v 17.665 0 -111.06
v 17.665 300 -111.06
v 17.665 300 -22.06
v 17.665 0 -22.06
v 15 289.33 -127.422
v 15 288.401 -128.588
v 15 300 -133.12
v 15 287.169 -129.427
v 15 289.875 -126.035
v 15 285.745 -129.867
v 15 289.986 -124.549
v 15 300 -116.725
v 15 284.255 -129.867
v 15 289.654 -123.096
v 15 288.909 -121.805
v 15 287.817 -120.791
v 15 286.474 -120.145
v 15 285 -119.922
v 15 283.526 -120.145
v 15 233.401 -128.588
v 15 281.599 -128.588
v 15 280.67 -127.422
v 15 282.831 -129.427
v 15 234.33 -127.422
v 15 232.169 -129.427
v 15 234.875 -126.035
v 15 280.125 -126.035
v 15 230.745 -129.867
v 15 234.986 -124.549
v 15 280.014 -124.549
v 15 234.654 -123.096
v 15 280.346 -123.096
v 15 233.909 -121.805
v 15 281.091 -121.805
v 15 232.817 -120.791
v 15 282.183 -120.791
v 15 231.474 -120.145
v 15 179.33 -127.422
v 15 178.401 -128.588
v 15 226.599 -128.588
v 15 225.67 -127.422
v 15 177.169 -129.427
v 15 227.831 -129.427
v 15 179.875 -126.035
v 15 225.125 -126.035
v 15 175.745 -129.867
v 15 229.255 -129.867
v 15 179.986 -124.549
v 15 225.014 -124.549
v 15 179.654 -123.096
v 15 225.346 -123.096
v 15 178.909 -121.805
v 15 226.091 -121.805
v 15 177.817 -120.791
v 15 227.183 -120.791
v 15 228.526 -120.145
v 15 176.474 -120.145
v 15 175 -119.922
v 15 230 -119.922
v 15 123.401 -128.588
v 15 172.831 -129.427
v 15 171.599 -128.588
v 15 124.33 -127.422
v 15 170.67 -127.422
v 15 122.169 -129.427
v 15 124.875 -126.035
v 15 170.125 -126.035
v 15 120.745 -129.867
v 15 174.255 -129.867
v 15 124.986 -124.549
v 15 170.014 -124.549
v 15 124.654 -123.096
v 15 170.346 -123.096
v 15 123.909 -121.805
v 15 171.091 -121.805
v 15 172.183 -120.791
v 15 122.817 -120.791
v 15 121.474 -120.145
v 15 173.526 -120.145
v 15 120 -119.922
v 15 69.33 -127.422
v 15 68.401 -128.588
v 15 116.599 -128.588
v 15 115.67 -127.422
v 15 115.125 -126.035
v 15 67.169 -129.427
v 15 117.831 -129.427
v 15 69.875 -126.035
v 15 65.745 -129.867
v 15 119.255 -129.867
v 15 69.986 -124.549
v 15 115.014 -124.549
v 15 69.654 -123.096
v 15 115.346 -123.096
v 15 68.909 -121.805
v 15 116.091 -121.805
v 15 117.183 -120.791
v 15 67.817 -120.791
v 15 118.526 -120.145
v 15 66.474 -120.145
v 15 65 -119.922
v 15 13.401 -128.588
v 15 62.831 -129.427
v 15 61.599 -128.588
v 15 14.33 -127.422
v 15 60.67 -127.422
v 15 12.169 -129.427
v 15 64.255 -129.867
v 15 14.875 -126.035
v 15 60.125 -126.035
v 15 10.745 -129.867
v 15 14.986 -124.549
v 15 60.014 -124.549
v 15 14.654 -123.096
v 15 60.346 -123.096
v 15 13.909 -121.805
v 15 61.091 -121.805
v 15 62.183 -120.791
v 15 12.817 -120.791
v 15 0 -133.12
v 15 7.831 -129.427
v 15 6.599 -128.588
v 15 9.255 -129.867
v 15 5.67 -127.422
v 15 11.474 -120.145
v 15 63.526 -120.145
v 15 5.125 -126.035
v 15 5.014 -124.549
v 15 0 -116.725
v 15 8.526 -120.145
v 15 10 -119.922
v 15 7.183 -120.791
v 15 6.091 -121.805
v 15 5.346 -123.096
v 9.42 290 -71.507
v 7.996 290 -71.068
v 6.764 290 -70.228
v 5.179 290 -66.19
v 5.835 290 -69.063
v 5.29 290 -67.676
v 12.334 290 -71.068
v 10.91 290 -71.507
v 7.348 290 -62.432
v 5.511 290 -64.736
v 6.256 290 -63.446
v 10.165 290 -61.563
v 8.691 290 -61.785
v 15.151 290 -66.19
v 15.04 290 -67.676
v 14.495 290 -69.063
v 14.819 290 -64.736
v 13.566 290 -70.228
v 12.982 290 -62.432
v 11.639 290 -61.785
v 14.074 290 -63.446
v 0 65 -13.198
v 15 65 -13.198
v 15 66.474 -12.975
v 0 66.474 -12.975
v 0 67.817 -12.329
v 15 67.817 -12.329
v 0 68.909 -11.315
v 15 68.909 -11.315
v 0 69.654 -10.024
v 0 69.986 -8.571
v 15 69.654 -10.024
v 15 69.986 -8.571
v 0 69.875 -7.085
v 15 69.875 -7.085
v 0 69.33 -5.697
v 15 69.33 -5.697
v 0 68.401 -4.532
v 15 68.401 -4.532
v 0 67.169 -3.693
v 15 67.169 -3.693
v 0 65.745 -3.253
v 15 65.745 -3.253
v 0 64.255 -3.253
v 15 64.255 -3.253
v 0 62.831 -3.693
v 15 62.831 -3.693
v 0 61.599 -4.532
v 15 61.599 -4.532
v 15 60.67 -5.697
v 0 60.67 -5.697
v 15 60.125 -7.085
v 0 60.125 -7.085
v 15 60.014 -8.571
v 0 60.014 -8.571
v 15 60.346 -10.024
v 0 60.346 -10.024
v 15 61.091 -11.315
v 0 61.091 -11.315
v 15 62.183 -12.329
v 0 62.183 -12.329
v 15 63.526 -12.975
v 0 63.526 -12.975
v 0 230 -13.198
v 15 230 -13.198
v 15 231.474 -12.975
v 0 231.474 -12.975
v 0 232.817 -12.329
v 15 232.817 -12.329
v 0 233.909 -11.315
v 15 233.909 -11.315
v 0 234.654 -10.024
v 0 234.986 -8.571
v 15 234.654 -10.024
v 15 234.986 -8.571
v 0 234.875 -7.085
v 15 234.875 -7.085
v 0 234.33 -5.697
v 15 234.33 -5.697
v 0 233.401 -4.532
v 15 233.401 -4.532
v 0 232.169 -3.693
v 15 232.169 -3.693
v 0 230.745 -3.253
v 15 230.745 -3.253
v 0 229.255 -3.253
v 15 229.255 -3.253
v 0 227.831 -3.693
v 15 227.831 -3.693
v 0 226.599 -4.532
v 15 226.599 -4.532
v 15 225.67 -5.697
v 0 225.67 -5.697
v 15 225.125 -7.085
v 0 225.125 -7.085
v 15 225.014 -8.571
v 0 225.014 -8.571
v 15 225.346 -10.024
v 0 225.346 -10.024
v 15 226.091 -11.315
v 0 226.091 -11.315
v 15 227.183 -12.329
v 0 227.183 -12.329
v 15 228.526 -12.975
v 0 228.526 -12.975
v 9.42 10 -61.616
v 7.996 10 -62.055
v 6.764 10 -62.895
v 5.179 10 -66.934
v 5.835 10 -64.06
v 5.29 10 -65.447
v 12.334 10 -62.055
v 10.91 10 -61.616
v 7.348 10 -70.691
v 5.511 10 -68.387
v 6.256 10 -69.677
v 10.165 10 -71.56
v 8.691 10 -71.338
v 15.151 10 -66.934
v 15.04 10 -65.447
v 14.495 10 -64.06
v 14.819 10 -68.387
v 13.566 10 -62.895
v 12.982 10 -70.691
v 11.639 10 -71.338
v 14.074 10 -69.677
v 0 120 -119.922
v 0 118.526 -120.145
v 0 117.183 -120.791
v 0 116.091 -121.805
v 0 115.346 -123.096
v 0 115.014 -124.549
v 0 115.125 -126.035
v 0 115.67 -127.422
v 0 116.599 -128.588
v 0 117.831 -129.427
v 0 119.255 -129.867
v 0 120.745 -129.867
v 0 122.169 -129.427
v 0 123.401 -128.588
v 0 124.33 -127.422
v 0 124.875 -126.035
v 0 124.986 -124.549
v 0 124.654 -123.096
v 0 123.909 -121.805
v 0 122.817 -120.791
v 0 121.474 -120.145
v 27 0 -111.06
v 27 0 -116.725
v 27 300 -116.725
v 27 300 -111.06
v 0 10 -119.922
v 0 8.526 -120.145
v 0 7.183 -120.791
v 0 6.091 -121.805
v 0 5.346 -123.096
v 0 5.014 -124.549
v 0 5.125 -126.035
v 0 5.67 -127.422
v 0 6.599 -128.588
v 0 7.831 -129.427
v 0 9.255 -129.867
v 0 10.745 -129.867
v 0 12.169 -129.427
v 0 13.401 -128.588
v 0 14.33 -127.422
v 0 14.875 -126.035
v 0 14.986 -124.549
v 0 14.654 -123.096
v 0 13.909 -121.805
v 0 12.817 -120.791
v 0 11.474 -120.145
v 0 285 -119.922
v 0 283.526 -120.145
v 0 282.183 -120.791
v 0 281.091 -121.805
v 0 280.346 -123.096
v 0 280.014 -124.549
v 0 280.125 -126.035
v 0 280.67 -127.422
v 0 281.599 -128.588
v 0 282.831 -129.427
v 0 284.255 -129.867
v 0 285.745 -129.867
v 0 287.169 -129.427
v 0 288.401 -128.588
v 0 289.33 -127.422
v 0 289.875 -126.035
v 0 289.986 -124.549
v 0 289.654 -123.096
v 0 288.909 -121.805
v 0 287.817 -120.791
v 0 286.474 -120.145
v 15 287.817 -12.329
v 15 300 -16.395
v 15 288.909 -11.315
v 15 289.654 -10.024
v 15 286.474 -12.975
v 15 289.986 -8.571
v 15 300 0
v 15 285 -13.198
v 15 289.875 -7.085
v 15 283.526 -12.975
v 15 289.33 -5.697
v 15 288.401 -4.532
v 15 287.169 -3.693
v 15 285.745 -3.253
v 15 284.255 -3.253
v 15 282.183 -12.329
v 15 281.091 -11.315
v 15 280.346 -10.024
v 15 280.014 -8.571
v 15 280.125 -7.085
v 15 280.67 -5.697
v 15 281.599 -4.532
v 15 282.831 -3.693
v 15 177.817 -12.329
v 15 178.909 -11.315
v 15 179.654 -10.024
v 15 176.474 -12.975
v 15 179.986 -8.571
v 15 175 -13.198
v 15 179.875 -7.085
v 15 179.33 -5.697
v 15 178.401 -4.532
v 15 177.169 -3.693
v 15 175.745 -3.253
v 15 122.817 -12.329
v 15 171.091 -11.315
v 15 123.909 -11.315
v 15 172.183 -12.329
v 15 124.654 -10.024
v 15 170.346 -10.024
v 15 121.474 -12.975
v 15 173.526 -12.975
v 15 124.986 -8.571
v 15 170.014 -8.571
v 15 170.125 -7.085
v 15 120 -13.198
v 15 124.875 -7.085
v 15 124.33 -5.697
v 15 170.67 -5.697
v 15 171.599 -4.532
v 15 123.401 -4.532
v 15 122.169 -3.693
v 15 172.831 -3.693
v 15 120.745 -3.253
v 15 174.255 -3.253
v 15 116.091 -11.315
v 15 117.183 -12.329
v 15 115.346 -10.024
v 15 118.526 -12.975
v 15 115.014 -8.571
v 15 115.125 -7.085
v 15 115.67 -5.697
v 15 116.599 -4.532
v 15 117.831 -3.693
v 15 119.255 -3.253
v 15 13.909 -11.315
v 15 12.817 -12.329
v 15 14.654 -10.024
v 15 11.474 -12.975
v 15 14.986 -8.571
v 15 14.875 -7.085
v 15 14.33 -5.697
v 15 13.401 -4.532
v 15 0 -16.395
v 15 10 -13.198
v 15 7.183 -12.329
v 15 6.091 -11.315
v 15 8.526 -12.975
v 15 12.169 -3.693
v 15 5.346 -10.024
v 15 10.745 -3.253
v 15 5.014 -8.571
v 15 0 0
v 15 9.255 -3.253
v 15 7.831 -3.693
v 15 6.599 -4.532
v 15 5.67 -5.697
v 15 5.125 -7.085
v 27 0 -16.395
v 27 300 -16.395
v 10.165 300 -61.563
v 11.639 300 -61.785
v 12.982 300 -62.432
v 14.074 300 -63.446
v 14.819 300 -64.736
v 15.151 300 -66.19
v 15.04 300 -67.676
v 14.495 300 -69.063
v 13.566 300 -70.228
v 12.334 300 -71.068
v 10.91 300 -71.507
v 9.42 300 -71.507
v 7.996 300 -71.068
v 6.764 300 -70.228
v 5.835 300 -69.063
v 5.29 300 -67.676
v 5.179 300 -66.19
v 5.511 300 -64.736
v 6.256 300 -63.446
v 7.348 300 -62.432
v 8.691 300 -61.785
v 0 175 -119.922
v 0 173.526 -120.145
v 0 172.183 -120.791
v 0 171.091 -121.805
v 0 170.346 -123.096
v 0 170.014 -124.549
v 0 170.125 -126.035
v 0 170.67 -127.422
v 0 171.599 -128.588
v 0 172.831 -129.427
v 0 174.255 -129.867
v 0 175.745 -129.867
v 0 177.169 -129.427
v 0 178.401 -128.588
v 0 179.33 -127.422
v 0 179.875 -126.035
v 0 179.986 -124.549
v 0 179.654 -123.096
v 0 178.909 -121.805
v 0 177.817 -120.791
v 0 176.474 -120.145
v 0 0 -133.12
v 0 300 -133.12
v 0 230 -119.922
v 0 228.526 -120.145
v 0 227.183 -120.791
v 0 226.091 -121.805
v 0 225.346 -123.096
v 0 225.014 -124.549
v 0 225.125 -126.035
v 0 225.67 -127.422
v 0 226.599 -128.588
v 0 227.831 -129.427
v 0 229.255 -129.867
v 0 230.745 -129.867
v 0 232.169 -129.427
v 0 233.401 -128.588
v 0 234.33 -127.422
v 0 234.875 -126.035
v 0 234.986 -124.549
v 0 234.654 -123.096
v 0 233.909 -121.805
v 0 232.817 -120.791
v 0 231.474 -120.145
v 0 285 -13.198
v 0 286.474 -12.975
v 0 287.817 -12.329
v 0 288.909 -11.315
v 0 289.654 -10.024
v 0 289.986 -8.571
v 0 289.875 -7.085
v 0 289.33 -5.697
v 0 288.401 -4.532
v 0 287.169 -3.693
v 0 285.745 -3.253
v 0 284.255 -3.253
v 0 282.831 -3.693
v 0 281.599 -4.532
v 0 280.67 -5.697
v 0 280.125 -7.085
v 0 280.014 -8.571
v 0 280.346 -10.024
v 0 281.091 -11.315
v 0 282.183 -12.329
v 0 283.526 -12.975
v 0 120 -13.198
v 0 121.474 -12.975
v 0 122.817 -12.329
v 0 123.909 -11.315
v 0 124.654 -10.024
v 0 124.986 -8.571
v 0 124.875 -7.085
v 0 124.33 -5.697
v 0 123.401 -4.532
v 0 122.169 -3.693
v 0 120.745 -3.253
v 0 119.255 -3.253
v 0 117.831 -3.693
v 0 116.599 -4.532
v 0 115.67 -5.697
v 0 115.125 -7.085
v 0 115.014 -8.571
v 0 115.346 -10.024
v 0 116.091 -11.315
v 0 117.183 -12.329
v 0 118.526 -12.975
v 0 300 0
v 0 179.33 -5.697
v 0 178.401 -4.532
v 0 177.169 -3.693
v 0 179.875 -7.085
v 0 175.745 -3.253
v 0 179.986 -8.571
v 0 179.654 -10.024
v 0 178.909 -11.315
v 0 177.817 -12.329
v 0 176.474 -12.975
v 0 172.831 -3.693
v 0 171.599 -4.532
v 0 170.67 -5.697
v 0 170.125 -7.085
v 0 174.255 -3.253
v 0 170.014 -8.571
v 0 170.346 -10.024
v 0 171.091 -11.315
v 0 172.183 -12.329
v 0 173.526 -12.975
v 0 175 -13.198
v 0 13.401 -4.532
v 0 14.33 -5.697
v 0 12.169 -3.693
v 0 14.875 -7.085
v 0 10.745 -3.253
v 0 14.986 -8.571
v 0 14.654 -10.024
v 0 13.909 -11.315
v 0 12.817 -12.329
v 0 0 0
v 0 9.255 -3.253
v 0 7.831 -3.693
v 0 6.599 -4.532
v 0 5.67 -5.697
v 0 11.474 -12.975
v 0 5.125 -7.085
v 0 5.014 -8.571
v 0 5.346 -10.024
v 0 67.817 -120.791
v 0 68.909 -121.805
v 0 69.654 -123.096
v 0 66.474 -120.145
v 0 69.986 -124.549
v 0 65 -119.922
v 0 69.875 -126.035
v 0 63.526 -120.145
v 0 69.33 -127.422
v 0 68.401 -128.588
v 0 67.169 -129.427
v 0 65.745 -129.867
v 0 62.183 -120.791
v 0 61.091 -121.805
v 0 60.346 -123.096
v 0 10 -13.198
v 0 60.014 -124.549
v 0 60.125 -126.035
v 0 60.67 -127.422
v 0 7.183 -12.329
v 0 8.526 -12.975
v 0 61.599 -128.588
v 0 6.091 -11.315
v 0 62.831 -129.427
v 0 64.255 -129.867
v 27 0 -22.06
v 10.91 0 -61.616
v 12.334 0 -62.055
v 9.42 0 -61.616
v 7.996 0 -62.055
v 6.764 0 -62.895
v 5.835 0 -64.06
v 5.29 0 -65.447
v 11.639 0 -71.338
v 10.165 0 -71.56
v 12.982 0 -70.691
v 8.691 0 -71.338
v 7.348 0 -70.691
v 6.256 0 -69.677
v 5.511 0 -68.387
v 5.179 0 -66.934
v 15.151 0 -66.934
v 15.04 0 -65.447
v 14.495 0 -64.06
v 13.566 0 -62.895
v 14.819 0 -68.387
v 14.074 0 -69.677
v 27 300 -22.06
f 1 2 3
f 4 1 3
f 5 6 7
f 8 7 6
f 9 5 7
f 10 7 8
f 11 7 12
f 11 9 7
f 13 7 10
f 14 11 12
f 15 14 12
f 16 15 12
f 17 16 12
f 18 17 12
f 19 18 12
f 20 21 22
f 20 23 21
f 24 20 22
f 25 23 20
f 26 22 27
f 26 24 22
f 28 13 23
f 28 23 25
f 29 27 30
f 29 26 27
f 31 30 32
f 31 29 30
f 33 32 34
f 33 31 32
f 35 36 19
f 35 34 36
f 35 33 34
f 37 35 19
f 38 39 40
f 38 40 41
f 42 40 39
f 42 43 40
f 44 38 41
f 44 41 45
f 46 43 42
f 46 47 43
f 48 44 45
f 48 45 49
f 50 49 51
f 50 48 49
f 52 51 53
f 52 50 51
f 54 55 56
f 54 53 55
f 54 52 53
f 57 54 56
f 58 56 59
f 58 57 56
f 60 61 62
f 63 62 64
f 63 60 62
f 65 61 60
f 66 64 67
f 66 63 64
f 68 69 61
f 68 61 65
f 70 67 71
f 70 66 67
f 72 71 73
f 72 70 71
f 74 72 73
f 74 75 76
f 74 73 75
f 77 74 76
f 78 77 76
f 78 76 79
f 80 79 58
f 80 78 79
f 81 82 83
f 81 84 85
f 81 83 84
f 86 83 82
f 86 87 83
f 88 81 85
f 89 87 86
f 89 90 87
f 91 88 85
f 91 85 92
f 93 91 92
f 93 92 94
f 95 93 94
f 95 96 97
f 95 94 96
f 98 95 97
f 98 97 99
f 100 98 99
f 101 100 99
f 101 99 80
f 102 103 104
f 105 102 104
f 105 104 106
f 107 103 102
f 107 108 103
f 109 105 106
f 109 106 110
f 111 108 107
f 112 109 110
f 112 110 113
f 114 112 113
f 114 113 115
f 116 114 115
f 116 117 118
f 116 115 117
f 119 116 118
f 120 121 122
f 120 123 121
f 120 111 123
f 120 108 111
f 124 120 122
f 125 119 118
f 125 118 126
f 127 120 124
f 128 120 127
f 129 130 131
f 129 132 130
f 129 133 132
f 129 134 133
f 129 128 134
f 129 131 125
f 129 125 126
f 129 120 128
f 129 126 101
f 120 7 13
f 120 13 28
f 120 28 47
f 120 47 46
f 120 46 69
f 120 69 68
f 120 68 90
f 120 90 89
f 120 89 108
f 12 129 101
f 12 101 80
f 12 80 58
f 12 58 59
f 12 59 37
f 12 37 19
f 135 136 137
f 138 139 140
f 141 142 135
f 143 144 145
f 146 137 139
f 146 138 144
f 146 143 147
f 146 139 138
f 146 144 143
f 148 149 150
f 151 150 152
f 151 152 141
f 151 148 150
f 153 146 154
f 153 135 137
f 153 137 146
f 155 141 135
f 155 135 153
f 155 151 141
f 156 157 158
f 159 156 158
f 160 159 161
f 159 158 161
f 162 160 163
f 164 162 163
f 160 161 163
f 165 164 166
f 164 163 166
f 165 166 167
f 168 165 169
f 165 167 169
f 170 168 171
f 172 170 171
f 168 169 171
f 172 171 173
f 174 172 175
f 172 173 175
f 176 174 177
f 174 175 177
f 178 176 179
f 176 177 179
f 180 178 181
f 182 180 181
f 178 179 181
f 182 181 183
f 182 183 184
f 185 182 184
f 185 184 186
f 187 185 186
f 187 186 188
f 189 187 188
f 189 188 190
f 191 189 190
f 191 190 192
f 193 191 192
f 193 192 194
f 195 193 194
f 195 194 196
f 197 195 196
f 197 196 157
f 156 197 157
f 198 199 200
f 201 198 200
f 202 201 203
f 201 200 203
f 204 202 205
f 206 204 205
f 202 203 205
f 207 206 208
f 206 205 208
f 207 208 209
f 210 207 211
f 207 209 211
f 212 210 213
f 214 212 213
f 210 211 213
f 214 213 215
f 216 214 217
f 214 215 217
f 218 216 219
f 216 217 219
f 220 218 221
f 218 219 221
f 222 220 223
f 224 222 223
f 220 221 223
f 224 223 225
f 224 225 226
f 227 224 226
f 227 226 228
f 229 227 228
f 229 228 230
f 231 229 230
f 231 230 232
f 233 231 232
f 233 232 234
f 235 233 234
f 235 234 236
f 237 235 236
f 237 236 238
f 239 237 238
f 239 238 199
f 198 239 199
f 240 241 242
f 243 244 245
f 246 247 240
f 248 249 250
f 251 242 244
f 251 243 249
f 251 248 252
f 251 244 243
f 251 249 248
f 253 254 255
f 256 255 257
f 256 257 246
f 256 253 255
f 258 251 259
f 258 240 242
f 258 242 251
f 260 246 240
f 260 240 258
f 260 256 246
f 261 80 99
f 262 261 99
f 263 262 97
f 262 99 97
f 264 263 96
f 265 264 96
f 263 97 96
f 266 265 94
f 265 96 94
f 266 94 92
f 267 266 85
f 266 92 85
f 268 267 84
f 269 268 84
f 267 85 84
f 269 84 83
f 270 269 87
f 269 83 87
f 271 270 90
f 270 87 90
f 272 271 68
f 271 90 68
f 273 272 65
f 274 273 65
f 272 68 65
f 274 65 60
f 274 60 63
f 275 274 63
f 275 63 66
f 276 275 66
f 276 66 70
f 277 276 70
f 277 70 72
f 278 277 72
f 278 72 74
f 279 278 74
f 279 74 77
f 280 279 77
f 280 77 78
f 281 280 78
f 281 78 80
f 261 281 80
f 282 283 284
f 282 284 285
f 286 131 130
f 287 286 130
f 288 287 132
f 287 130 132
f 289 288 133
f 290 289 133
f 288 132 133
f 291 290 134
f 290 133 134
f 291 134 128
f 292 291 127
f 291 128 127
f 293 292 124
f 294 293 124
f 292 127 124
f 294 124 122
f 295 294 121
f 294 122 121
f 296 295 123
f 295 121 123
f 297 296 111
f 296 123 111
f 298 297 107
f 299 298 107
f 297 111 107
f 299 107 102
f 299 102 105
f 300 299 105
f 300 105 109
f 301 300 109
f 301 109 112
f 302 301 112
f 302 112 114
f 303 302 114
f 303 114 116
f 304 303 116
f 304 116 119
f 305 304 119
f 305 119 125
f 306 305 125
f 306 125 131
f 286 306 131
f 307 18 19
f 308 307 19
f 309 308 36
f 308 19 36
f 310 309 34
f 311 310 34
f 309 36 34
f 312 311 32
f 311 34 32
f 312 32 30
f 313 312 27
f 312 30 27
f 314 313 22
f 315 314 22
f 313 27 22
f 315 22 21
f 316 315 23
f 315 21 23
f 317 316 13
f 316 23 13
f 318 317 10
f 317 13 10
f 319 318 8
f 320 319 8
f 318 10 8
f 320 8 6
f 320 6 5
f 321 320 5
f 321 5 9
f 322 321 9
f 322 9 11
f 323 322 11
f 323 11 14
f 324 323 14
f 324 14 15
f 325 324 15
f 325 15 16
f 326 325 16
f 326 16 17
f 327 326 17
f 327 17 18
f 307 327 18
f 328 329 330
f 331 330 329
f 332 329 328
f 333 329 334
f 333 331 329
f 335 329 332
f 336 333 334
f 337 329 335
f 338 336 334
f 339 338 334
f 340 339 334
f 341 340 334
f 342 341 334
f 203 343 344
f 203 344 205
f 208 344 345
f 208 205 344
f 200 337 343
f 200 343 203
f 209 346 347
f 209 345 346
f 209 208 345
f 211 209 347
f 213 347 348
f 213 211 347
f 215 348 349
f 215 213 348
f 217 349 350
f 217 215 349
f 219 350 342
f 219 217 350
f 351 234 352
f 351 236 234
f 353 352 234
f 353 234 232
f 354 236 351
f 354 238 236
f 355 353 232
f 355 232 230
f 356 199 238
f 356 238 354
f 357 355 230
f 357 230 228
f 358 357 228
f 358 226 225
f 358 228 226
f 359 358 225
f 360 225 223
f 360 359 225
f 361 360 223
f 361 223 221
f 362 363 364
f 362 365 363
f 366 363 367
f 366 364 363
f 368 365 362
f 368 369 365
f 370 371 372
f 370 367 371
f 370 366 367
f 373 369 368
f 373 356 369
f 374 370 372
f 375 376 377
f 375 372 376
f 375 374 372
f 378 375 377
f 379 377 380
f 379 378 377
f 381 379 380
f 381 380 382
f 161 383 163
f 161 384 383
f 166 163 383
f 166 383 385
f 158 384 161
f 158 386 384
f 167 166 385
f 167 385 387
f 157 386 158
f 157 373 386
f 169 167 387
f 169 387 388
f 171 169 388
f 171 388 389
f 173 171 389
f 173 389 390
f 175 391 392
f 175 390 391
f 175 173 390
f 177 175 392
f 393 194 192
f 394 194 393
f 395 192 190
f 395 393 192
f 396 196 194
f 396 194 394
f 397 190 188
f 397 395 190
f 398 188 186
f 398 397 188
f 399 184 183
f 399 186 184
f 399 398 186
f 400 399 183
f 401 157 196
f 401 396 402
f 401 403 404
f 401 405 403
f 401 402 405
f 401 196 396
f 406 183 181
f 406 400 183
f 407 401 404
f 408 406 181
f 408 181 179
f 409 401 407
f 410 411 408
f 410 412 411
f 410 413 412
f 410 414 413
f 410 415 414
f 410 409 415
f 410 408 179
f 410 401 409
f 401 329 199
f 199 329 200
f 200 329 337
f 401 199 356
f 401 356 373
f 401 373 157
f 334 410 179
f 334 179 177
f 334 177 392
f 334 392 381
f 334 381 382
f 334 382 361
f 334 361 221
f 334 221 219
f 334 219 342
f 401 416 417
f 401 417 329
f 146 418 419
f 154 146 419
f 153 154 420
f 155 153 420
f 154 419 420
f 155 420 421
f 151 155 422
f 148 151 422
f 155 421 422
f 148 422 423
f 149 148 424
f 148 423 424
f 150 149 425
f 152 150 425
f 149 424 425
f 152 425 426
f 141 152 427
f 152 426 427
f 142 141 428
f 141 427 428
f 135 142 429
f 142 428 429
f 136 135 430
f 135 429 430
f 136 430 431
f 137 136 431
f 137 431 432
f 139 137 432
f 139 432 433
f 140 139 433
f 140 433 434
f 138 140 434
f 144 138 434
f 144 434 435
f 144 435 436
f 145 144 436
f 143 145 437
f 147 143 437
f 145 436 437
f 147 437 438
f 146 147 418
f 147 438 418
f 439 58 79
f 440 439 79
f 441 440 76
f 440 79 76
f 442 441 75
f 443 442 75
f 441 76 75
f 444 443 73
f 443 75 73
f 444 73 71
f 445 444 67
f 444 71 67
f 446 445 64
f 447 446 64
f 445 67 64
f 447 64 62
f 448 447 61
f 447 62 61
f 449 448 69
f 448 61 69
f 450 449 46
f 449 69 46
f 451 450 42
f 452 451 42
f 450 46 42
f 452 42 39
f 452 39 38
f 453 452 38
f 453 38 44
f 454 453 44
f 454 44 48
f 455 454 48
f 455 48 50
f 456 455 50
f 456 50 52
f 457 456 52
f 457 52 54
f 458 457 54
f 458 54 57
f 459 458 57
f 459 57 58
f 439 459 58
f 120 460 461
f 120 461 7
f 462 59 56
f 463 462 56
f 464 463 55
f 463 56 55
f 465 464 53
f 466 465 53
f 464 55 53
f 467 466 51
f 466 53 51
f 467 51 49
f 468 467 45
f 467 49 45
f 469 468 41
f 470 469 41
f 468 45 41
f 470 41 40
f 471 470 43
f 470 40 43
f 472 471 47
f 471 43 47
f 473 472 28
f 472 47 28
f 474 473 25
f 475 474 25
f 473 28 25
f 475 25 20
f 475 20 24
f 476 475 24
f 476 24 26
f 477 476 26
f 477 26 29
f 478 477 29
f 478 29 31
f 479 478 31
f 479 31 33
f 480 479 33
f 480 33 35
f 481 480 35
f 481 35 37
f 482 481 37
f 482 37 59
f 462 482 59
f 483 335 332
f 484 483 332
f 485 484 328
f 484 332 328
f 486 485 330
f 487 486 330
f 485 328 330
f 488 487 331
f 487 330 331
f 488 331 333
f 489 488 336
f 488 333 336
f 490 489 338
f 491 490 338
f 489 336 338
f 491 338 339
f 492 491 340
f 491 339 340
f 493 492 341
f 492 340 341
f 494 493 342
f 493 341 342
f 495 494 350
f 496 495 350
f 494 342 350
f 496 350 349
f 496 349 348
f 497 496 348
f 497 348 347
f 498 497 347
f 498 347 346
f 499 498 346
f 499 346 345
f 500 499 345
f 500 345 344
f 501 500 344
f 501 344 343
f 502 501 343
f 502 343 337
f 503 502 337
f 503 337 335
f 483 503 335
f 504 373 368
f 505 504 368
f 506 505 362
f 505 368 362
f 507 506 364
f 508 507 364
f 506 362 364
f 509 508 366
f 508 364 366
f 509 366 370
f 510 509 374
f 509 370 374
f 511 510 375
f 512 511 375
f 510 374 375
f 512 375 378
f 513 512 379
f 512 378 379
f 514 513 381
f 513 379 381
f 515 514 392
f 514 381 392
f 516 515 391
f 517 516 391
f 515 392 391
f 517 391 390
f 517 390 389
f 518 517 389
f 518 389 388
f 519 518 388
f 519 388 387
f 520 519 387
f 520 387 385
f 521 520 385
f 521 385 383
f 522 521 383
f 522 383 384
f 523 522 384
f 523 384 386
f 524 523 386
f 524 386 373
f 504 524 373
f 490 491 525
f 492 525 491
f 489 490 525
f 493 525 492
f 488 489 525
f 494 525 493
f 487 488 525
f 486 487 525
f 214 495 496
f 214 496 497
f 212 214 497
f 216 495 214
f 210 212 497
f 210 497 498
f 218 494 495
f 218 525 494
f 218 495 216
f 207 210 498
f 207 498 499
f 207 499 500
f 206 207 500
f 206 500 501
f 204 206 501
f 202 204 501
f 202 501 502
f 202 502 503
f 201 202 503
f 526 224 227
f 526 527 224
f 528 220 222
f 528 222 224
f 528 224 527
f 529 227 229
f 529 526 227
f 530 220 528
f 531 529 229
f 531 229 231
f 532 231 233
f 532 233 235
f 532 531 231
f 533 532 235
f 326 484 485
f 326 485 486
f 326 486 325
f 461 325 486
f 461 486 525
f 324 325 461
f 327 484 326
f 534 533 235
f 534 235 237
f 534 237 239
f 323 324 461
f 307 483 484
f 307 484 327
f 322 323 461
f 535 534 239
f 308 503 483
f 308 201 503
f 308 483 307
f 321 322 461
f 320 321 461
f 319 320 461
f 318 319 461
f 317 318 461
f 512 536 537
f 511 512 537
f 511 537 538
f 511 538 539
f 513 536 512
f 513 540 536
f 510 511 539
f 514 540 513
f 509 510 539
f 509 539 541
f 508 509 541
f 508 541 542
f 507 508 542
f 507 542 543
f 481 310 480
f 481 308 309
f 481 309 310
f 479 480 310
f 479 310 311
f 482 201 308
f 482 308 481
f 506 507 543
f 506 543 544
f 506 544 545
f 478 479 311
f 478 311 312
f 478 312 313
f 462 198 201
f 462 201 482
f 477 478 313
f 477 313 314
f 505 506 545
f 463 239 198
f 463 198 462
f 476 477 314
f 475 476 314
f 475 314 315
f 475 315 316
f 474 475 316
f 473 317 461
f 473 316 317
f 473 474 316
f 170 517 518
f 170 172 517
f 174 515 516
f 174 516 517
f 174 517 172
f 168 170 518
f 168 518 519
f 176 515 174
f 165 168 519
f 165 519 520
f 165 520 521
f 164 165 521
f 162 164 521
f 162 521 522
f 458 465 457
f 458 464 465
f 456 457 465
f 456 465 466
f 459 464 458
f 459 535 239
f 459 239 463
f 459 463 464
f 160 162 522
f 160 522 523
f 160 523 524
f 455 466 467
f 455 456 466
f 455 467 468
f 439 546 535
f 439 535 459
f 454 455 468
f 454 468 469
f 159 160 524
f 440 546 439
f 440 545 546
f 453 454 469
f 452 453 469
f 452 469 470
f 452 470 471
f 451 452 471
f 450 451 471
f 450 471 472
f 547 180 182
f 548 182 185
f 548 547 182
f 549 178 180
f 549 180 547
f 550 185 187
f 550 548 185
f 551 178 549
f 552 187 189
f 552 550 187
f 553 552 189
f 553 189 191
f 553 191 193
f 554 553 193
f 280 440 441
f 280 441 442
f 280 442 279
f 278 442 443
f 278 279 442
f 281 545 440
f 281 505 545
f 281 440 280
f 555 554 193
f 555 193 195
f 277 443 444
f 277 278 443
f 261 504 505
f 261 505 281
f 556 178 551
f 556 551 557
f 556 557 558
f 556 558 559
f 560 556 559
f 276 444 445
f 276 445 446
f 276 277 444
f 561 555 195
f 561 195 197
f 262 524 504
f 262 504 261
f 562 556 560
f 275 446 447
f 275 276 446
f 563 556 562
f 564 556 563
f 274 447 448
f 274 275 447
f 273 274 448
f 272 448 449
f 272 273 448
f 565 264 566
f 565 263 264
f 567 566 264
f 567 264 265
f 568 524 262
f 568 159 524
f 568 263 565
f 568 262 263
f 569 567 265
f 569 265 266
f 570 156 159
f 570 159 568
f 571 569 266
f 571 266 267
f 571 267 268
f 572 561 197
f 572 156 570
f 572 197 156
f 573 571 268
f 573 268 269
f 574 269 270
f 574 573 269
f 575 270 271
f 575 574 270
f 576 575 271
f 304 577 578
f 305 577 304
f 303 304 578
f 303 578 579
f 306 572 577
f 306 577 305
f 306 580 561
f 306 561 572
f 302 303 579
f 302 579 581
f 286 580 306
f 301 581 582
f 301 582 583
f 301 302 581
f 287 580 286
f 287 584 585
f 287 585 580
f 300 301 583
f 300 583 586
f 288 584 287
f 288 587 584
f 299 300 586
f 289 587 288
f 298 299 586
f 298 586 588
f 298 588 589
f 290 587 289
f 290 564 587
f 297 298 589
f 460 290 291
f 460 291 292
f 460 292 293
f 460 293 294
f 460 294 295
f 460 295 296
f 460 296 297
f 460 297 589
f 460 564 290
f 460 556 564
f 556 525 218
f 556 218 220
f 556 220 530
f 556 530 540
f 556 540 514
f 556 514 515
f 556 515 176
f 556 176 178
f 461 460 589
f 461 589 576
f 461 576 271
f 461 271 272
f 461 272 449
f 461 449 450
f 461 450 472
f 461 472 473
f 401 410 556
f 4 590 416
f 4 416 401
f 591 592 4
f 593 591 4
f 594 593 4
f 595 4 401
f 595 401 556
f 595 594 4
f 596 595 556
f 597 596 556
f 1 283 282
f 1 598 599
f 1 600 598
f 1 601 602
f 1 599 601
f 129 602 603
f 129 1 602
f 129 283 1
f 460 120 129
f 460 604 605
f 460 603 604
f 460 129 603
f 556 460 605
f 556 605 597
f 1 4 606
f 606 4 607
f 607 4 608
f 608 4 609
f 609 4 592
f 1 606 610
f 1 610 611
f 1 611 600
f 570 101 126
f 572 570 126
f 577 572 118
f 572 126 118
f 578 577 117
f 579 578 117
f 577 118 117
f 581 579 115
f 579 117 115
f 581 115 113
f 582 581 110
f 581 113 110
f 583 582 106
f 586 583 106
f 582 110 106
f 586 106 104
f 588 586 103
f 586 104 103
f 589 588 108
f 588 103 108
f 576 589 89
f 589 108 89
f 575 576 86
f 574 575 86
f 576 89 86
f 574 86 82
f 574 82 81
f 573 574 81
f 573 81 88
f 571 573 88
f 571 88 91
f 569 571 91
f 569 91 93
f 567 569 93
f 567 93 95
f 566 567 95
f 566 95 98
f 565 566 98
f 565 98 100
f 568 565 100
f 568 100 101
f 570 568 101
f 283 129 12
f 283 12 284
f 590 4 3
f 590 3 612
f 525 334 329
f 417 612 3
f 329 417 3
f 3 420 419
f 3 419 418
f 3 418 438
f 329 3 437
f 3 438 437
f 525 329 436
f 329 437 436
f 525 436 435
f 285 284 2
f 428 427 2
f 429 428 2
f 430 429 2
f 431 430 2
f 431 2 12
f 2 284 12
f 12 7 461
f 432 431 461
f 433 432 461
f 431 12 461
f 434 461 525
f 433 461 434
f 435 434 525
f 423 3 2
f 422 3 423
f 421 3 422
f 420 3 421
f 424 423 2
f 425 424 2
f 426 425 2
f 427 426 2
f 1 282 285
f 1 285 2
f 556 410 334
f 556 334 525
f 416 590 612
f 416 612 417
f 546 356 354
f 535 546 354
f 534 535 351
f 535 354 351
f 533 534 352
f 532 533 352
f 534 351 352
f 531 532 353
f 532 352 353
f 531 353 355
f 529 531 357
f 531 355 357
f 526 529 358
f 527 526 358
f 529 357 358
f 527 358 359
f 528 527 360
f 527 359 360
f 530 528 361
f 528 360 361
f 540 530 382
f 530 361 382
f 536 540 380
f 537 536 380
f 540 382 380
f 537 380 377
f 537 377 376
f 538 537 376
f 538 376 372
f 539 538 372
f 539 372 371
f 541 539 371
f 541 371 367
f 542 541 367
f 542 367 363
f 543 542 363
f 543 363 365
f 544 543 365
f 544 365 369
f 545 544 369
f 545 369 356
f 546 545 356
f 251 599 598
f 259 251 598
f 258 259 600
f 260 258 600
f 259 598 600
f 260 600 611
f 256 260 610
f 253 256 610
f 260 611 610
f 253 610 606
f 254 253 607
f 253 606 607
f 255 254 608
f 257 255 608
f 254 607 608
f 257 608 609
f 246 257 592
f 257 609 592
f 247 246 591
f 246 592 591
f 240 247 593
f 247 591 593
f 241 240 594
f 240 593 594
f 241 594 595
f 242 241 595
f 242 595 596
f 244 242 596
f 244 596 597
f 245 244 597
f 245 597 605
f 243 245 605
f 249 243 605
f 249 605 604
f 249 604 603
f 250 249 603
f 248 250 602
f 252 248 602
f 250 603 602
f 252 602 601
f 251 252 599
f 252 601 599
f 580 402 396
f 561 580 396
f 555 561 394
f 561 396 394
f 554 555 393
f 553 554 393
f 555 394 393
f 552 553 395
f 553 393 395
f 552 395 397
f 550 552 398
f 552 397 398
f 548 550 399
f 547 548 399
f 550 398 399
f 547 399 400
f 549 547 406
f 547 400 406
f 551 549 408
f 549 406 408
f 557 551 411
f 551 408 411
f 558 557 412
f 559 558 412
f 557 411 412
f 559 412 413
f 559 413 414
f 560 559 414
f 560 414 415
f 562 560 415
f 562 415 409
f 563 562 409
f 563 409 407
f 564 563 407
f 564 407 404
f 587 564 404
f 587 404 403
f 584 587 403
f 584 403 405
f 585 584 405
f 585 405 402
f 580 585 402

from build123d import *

# Parameters (mm, degrees)
BOSS_EXTRUDE1_DEPTH = 300
SKETCH3_R           = 5
CUT_EXTRUDE1_DEPTH  = 329.551266015
SKETCH5_R           = 5
CUT_EXTRUDE2_DEPTH  = 10
SKETCH7_R           = 5
CUT_EXTRUDE5_DEPTH  = 10


with BuildPart() as part:
    # Sketch2 → Boss-Extrude1 (new body)
    with BuildSketch(Plane(origin=(0, 0, 0), x_dir=(1, 0, 0), z_dir=(0, 1, 0))):
        Polygon((0, 0), (0, 133.12), (15, 133.12), (15, 116.725), (27, 116.725), (27, 111.06), (17.665, 111.06), (17.665, 22.06), (27, 22.06), (27, 16.395), (15, 16.395), (15, 0), align=None)
    extrude(amount=BOSS_EXTRUDE1_DEPTH)

    # Sketch3 → Cut-Extrude1 (cut, through all)
    with BuildSketch(Plane(origin=(15, 0, 0), x_dir=(0, 0, -1), z_dir=(1, 0, 0))):
        with Locations((8.1975, 285)):
            Circle(SKETCH3_R)
        with Locations((8.1975, 230)):
            Circle(SKETCH3_R)
        with Locations((8.1975, 175)):
            Circle(SKETCH3_R)
        with Locations((8.1975, 120)):
            Circle(SKETCH3_R)
        with Locations((8.1975, 65)):
            Circle(SKETCH3_R)
        with Locations((8.1975, 10)):
            Circle(SKETCH3_R)
        with Locations(Location((124.9225, 10, 0), (0, 0, 180))):
            Circle(SKETCH3_R)
        with Locations(Location((124.9225, 65, 0), (0, 0, 180))):
            Circle(SKETCH3_R)
        with Locations(Location((124.9225, 120, 0), (0, 0, 180))):
            Circle(SKETCH3_R)
        with Locations(Location((124.9225, 175, 0), (0, 0, 180))):
            Circle(SKETCH3_R)
        with Locations(Location((124.9225, 230, 0), (0, 0, 180))):
            Circle(SKETCH3_R)
        with Locations(Location((124.9225, 285, 0), (0, 0, 180))):
            Circle(SKETCH3_R)
    extrude(amount=-CUT_EXTRUDE1_DEPTH, mode=Mode.SUBTRACT)

    # Sketch5 → Cut-Extrude2 (cut)
    with BuildSketch(Plane(origin=(0, 300, 0), x_dir=(1, 0, 0), z_dir=(0, 1, 0))):
        with Locations(Location((10.165, 66.563164806, 0), (0, 0, 270))):
            Circle(SKETCH5_R)
    extrude(amount=-CUT_EXTRUDE2_DEPTH, mode=Mode.SUBTRACT)

    # Sketch7 → Cut-Extrude5 (cut)
    with BuildSketch(Plane.XZ):
        with Locations(Location((10.165, -66.56, 0), (0, 0, 270))):
            Circle(SKETCH7_R)
    extrude(amount=-CUT_EXTRUDE5_DEPTH, mode=Mode.SUBTRACT)


solid = part.part
